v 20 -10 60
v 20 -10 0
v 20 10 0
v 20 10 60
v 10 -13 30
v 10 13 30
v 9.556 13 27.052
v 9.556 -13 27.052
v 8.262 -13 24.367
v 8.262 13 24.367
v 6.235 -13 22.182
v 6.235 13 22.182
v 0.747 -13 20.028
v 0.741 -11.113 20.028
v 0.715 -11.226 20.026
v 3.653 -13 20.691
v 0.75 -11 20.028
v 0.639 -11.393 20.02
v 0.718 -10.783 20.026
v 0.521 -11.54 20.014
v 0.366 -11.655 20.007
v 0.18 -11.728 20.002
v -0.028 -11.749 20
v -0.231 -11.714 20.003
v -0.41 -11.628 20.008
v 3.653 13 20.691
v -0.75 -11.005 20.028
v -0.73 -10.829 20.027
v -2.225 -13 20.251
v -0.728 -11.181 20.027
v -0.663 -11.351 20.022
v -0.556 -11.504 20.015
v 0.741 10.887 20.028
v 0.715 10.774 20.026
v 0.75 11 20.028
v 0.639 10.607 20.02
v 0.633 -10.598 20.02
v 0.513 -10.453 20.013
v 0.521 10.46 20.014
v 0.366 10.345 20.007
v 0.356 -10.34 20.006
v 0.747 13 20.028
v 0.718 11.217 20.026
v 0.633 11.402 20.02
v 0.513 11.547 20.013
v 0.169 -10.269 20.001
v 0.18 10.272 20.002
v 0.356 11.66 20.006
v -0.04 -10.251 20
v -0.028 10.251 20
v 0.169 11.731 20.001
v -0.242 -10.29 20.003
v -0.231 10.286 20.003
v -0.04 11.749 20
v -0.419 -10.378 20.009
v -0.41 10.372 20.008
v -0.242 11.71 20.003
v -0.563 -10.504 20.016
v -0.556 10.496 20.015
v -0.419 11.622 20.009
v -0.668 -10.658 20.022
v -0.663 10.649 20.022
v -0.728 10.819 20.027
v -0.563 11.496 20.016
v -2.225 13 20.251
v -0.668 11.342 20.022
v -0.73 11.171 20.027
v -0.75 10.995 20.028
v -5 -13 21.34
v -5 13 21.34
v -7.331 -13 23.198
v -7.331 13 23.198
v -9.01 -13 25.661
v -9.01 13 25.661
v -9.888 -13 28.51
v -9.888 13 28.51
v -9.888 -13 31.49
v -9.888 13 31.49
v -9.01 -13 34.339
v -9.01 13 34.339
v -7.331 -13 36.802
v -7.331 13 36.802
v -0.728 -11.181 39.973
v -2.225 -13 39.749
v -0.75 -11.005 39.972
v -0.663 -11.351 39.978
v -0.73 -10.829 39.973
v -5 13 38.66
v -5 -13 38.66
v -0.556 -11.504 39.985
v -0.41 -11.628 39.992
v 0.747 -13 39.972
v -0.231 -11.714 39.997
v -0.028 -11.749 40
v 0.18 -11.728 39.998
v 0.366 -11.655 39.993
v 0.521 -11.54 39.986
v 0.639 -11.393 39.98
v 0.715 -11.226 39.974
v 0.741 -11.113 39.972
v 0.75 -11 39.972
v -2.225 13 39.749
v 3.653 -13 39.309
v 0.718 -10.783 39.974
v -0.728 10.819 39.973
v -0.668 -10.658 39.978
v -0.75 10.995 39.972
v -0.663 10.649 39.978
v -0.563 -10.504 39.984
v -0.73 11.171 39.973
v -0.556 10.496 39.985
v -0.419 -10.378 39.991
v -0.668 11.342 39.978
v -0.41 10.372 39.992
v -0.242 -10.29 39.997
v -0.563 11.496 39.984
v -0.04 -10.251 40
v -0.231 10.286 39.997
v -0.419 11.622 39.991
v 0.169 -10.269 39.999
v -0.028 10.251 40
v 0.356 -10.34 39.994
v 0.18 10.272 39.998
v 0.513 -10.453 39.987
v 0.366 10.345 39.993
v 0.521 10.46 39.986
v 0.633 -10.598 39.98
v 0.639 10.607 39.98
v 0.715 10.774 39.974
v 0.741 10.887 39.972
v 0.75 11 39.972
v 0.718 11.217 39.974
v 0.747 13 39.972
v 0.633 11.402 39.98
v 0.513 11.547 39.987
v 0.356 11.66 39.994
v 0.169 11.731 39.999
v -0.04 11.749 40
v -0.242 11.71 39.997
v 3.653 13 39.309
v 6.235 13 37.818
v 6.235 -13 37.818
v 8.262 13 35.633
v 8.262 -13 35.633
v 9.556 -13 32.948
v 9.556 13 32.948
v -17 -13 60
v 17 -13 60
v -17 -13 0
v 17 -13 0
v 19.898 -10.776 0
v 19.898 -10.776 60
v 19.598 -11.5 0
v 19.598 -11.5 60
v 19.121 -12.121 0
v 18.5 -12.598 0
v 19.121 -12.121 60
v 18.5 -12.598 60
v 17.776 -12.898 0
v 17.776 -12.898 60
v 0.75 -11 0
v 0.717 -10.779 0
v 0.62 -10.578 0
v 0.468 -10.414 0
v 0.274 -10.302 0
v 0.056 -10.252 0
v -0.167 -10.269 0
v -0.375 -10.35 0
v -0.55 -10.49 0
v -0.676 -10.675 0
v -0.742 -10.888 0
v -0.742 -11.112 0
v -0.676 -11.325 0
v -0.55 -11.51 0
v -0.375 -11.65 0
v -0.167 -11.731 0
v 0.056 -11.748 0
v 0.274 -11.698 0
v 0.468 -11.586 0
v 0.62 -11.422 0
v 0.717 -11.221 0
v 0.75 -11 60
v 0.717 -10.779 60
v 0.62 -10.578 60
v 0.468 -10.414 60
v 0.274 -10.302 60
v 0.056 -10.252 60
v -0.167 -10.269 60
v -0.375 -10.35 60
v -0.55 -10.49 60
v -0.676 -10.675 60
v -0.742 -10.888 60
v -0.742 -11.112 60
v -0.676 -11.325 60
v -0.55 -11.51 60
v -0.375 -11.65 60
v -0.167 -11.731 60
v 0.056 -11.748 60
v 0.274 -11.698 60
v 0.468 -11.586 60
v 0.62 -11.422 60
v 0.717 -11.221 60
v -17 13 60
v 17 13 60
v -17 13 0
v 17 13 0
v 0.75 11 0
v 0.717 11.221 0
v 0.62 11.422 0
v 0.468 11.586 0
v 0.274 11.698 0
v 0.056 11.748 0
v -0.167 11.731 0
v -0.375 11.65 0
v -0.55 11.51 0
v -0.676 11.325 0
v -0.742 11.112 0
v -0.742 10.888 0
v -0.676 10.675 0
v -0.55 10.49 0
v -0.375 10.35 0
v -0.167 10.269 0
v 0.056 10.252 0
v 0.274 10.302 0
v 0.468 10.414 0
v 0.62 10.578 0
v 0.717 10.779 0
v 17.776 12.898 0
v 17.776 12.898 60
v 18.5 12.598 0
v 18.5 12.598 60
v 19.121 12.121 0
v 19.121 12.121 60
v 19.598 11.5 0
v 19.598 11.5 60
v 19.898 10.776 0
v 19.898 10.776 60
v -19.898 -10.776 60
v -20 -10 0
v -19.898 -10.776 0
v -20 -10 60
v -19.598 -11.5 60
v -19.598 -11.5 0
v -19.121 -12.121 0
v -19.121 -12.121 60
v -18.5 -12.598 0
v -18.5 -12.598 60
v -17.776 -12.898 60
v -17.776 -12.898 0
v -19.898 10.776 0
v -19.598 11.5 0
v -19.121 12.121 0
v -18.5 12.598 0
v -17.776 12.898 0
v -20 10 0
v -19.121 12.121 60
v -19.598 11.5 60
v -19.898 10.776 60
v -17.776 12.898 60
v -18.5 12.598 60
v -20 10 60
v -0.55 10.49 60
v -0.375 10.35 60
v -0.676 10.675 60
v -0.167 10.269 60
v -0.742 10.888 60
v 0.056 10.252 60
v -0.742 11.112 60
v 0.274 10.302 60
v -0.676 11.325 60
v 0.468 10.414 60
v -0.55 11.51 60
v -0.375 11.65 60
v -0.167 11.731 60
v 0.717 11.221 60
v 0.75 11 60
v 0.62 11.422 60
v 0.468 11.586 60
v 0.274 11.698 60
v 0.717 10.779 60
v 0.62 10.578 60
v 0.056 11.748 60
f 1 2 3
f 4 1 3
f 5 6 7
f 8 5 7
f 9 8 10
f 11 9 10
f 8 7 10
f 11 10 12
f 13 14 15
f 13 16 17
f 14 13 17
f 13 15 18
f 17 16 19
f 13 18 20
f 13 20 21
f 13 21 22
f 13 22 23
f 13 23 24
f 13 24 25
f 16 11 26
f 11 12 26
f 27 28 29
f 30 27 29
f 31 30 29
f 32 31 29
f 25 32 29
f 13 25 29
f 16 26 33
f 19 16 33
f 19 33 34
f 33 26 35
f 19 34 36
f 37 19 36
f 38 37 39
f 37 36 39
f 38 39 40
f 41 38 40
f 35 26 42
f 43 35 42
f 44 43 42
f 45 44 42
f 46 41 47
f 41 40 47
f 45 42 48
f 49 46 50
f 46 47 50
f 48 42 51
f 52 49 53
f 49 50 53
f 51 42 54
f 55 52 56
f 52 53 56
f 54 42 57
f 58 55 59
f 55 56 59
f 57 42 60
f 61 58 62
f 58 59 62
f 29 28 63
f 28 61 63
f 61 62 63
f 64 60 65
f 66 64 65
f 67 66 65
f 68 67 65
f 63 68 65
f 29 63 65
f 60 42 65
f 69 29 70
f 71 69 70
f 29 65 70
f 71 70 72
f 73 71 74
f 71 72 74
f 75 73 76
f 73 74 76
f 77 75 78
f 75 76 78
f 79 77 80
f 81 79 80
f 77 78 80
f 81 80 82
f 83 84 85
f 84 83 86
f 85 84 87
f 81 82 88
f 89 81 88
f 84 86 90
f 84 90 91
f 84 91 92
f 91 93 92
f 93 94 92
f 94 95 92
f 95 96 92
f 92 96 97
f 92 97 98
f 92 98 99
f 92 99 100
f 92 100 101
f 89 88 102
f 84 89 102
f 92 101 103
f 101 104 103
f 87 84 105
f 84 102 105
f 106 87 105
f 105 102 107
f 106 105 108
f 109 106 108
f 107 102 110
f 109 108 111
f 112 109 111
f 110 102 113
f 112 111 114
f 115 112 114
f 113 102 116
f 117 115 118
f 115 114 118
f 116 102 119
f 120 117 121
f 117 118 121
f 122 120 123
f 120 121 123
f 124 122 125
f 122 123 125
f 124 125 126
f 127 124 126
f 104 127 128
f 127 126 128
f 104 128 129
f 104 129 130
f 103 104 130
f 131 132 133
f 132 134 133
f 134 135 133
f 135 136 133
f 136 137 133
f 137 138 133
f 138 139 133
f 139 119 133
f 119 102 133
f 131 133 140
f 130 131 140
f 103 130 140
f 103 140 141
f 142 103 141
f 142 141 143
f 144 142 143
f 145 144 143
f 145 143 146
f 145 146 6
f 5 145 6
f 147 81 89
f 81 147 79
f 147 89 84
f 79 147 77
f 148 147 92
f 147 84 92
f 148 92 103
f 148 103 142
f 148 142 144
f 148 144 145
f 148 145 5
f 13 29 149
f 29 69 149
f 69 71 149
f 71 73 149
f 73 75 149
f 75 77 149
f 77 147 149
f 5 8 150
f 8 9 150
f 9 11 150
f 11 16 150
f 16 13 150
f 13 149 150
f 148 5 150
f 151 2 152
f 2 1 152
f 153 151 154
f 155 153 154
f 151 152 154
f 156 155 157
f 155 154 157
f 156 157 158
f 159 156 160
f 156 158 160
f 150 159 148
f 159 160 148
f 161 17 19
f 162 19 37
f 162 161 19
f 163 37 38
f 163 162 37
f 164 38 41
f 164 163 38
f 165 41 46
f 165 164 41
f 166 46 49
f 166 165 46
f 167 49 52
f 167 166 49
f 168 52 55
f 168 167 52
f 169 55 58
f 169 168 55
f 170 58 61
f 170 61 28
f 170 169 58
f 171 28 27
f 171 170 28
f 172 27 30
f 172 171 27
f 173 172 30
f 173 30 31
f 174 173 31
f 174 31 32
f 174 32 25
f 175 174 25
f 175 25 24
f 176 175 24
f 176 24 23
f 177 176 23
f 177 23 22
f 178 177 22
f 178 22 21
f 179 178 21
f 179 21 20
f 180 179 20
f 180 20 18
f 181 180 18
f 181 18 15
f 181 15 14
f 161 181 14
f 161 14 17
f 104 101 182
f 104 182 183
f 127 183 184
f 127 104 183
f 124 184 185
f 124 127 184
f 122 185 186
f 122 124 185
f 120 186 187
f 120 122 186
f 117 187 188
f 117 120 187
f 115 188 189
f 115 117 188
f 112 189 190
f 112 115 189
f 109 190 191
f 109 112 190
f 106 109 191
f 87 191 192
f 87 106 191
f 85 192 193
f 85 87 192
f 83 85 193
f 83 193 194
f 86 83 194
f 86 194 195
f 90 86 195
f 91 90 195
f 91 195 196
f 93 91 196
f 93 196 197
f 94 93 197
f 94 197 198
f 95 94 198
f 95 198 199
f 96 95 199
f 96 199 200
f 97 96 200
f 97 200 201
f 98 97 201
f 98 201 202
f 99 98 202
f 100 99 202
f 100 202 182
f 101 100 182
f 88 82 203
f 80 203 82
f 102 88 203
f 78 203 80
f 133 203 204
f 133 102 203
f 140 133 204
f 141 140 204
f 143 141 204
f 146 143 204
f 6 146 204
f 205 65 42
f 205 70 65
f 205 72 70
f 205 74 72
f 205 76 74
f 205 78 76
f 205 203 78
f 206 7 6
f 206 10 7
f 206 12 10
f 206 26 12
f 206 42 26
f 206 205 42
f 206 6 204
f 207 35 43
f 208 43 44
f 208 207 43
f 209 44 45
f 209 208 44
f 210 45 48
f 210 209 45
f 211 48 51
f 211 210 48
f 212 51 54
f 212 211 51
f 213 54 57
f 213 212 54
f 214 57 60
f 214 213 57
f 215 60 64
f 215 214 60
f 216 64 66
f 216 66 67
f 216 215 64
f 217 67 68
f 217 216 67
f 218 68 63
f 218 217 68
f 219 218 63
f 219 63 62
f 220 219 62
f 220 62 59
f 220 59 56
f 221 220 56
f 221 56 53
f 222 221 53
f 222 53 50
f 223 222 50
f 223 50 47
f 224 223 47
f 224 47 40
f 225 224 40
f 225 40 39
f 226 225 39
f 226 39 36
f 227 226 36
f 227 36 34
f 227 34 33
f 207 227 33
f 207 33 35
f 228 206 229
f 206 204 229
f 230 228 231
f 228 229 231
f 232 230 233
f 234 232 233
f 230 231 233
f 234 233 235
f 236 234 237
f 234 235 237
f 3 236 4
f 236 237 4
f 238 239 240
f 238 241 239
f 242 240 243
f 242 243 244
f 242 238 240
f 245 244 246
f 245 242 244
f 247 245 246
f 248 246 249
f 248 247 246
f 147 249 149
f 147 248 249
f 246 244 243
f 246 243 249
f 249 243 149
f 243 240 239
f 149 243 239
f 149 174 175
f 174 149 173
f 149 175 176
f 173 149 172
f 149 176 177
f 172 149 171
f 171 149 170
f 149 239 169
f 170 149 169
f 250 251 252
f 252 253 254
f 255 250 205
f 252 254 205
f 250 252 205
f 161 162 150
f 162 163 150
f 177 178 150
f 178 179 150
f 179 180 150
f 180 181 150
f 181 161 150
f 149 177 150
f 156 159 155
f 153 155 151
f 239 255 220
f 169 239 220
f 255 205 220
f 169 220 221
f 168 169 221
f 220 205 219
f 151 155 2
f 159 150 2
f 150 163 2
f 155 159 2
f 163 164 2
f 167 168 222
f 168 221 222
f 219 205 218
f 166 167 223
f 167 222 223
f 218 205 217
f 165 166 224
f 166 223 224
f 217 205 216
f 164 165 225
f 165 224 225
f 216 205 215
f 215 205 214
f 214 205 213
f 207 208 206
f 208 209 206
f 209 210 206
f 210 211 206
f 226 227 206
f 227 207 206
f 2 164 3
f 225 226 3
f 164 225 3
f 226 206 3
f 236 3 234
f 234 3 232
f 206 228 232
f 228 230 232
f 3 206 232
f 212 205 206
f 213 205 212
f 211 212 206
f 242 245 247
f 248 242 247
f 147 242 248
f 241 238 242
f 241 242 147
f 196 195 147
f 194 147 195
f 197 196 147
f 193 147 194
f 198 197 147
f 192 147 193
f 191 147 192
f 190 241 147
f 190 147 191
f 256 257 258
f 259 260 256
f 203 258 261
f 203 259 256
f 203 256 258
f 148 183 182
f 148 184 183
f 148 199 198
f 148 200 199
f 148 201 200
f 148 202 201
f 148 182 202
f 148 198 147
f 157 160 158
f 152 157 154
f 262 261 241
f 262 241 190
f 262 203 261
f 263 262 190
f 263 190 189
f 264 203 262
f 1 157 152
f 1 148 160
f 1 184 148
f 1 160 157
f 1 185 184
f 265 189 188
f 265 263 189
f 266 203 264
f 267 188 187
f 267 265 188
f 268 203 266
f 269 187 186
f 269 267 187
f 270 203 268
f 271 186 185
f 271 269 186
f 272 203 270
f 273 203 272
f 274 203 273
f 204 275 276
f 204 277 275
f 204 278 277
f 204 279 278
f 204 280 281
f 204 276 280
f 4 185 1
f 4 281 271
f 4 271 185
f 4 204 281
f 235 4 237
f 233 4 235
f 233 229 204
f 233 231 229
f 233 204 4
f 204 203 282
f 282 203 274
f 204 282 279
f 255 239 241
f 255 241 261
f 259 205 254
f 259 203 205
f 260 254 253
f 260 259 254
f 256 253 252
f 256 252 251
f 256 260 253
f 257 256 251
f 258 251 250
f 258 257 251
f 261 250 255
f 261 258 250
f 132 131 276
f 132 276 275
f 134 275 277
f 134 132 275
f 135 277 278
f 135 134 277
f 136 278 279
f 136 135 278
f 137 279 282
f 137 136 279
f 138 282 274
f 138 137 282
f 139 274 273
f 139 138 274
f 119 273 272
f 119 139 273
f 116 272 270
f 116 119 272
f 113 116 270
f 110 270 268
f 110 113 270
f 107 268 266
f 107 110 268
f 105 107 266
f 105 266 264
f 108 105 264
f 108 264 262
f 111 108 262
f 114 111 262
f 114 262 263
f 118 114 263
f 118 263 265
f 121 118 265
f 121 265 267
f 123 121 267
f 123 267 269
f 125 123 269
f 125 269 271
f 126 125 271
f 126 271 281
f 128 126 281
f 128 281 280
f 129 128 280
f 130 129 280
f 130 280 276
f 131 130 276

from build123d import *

# Parameters (mm, degrees)
SKETCH1_W           = 40
SKETCH1_H           = 26
SKETCH1_R           = 0.75
BOSS_EXTRUDE1_DEPTH = 60
FILLET1_R           = 3
FILLET2_R           = 3
SKETCH2_R           = 10
CUT_EXTRUDE1_DEPTH  = 27


with BuildPart() as part:
    # Sketch1 → Boss-Extrude1 (new body)
    with BuildSketch(Plane.XY):
        Rectangle(SKETCH1_W, SKETCH1_H)
        with Locations((0, 11)):
            Circle(SKETCH1_R, mode=Mode.SUBTRACT)
        with Locations((0, -11)):
            Circle(SKETCH1_R, mode=Mode.SUBTRACT)
    extrude(amount=BOSS_EXTRUDE1_DEPTH)

    # Fillet1
    fillet1_edges = [part.edges().sort_by_distance(p)[0] for p in [
        (20, 13, 30),
    ]]
    fillet(fillet1_edges, radius=FILLET1_R)

    # Fillet2
    fillet2_edges = [part.edges().sort_by_distance(p)[0] for p in [
        (20, -13, 30),
        (-20, -13, 30),
        (-20, 13, 30),
    ]]
    fillet(fillet2_edges, radius=FILLET2_R)

    # Sketch2 → Cut-Extrude1 (cut, through all)
    with BuildSketch(Plane(origin=(0, 13, 0), x_dir=(1, 0, 0), z_dir=(0, 1, 0))):
        with Locations((0, -30)):
            Circle(SKETCH2_R)
    extrude(amount=-CUT_EXTRUDE1_DEPTH, mode=Mode.SUBTRACT)


solid = part.part
